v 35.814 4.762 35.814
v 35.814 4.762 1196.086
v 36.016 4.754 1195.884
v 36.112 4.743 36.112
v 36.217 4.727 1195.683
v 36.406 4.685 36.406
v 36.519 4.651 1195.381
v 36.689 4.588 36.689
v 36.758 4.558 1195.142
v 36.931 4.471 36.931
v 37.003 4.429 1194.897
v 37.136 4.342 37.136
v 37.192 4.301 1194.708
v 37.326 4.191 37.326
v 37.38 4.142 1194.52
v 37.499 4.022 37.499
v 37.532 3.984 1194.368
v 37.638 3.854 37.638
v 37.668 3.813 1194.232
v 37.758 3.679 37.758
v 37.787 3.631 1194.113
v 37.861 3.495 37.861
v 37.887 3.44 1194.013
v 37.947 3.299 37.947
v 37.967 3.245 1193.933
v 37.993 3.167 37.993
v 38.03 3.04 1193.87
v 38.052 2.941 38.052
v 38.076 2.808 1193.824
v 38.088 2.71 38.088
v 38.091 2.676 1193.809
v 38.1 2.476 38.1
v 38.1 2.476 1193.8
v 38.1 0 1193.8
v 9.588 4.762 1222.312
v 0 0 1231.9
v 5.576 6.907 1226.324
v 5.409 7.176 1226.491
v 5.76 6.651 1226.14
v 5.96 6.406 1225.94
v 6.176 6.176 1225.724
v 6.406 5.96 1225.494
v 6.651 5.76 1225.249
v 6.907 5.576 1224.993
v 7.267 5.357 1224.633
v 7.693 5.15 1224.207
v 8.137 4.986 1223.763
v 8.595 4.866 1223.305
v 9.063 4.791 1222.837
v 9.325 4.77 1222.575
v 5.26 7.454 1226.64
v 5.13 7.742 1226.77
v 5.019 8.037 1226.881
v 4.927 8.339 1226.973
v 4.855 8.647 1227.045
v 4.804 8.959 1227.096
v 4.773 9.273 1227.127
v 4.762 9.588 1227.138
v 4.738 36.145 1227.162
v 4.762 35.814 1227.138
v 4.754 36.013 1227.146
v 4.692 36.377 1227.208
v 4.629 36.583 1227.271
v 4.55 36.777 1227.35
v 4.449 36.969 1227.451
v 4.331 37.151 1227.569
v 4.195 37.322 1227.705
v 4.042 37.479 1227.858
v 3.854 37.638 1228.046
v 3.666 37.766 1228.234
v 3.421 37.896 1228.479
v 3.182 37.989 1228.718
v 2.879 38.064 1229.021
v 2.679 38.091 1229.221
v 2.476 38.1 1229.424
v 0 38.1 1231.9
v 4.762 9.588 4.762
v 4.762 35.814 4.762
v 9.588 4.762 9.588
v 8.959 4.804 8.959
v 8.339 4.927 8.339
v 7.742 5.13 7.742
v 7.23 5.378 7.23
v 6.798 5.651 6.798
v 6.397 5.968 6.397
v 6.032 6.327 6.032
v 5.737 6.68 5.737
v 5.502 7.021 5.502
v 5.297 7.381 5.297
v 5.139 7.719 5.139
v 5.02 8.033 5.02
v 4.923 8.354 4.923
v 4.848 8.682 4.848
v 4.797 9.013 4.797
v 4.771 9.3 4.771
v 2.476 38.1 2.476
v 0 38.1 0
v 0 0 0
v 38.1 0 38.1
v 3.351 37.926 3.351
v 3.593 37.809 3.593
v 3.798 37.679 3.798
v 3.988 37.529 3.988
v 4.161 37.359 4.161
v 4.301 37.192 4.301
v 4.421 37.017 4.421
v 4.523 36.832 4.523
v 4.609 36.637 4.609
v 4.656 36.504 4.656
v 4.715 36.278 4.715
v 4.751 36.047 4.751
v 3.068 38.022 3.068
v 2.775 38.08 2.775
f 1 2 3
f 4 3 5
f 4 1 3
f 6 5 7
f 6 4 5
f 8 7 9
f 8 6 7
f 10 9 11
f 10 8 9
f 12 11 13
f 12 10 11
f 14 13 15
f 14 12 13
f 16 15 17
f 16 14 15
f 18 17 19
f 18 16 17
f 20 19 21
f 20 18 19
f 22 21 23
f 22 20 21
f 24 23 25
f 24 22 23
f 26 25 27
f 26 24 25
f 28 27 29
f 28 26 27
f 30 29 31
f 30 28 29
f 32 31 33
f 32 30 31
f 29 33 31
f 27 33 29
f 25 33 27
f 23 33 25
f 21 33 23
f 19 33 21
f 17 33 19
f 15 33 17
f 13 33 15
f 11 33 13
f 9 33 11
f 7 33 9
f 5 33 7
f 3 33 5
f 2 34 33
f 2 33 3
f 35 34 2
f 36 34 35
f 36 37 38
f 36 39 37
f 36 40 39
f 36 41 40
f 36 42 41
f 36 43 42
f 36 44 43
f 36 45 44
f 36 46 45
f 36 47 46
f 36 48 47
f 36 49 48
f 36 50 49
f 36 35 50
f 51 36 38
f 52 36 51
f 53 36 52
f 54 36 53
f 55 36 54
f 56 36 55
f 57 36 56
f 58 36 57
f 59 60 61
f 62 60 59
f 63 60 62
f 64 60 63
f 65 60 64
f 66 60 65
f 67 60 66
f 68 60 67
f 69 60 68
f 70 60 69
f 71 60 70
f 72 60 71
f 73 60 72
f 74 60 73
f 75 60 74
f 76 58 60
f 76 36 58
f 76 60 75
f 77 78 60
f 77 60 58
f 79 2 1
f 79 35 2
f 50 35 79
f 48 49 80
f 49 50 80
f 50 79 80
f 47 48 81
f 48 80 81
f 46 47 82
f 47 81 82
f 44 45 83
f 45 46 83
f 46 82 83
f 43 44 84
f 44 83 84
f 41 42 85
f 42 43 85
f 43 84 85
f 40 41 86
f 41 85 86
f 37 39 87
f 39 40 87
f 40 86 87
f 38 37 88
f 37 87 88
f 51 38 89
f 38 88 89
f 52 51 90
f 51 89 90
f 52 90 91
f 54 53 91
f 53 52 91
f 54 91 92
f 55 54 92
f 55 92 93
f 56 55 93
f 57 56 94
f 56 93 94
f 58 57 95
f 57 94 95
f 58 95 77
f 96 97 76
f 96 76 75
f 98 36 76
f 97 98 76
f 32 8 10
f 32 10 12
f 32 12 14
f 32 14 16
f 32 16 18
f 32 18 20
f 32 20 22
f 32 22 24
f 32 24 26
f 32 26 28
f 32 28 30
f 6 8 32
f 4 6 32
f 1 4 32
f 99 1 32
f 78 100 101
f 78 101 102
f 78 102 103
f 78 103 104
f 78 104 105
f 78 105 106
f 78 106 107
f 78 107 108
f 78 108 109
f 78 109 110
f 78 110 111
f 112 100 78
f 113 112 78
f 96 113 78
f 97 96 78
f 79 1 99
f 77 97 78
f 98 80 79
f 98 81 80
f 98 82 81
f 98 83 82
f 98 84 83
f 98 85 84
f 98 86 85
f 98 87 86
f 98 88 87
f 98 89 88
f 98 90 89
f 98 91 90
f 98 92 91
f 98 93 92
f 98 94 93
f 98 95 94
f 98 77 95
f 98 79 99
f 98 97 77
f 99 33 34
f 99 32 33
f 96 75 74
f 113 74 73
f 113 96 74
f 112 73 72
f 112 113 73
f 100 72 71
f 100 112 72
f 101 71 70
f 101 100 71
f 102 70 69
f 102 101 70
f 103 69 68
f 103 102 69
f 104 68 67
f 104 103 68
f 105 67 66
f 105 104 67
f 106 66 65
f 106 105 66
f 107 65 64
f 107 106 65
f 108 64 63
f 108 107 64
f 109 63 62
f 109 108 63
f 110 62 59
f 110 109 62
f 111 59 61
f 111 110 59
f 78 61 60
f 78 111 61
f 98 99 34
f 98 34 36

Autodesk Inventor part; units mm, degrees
ref_plane "Start plane" through (0, 0, 0) normal (0, 0, 1) x (1, 0, 0)
ref_plane "End plane" through (0, 0, 1231.9) normal (0, 0, 1) x (1, 0, 0)
sketch "Sketch" plane through (0, 0, 0) normal (0, 0, 1) x (1, 0, 0)
  line L0 (38.1, 0) -> (0, 0)
  line L1 (0, 0) -> (0, 38.1)
  line L2 (0, 38.1) -> (2.4765, 38.1)
  line L3 (4.7625, 35.814) -> (4.7625, 9.5885)
  line L4 (9.5885, 4.7625) -> (35.814, 4.7625)
  line L5 (38.1, 2.4765) -> (38.1, 0)
  line L6 (0, -11.0414) -> (0, 31.5385) construction
  line L7 (-11.0414, 0) -> (31.5385, 0) construction
  arc A0 (4.7625, 9.5885) -> (9.5885, 4.7625) centre (9.5885, 9.5885) ccw
  arc A1 (4.7625, 35.814) -> (2.4765, 38.1) centre (2.4765, 35.814) ccw
  arc A2 (38.1, 2.4765) -> (35.814, 4.7625) centre (35.814, 2.4765) ccw
  line L8 (0, 48.4964) -> (0, -20.9644) construction
  line L9 (-20.9644, 0) -> (48.4964, 0) construction
  point P0 (4.7625, 38.1)
  point P1 (4.7625, 4.7625)
  point P2 (38.1, 4.7625)
  dimension "d0" = 38.1
  dimension "d1" = 38.1
  dimension "d2" = 4.7625
  dimension "d3" = 4.7625
  dimension "d10" = 0
  dimension "d11" = 0
  dimension "d14" = 4.826
  dimension "d15" = 2.286
extrude "Body" add sketch "Sketch" along normal up to surface (1231.9 mm away) from surface at 0
sketch "Sketch3" plane through (0, 0, 0) normal (0, 0, 1) x (1, 0, 0)
  line L0 (0, 0) -> (10, 0)
ref_plane "Work Plane3" through (0, 0, 0) normal (0, -1, 0) x (1, 0, 0)
sketch "Sketch4" plane through (0, 0, 0) normal (0, -1, 0) x (1, 0, 0)
  line L0 (-2, 0) -> (12, 0)
  line L1 (-2, 1231.9) -> (12, 1231.9)
  dimension "d17" = 1231.9
ref_plane "Work Plane4" through (0, 19.05, 1231.9) normal (0.7071, 0, 0.7071) x (0.7071, 0, -0.7071)
split "Split1" plane through (0, 19.05, 1231.9) removes the side toward (0.7071, 0, 0.7071)
ref_plane "Work Plane5" through (0, 19.05, 0) normal (0.7071, 0, -0.7071) x (-0.7071, 0, -0.7071)
split "Split2" plane through (0, 19.05, 0) removes the side toward (0.7071, 0, -0.7071)
equation "\"d0\" = G_H"
equation "\"d1\" = G_H"
equation "\"d2\" = G_T"
equation "\"d3\" = G_T"
equation "\"d14\" = G_IR"
equation "\"d15\" = G_ER"
equation "\"d4\" = G_L"
equation "\"G_H\" = 38.1"
equation "\"G_T\" = 4.7625"
equation "\"G_ER\" = 2.286"
equation "\"G_IR\" = 4.826"
equation "\"G_L\" = d17"
equation "\"ex\" = 0"
equation "\"G_OFFSET_START\" = 0"
equation "\"G_OFFSET_END\" = 0"
equation "\"d13\" = G_OFFSET_END + B_L"
equation "\"B_L\" = 1231.9"
properties part number "AISC - L 1.5 x 1.5 x 3/16 - 48.5" material "Aluminum 6061"
